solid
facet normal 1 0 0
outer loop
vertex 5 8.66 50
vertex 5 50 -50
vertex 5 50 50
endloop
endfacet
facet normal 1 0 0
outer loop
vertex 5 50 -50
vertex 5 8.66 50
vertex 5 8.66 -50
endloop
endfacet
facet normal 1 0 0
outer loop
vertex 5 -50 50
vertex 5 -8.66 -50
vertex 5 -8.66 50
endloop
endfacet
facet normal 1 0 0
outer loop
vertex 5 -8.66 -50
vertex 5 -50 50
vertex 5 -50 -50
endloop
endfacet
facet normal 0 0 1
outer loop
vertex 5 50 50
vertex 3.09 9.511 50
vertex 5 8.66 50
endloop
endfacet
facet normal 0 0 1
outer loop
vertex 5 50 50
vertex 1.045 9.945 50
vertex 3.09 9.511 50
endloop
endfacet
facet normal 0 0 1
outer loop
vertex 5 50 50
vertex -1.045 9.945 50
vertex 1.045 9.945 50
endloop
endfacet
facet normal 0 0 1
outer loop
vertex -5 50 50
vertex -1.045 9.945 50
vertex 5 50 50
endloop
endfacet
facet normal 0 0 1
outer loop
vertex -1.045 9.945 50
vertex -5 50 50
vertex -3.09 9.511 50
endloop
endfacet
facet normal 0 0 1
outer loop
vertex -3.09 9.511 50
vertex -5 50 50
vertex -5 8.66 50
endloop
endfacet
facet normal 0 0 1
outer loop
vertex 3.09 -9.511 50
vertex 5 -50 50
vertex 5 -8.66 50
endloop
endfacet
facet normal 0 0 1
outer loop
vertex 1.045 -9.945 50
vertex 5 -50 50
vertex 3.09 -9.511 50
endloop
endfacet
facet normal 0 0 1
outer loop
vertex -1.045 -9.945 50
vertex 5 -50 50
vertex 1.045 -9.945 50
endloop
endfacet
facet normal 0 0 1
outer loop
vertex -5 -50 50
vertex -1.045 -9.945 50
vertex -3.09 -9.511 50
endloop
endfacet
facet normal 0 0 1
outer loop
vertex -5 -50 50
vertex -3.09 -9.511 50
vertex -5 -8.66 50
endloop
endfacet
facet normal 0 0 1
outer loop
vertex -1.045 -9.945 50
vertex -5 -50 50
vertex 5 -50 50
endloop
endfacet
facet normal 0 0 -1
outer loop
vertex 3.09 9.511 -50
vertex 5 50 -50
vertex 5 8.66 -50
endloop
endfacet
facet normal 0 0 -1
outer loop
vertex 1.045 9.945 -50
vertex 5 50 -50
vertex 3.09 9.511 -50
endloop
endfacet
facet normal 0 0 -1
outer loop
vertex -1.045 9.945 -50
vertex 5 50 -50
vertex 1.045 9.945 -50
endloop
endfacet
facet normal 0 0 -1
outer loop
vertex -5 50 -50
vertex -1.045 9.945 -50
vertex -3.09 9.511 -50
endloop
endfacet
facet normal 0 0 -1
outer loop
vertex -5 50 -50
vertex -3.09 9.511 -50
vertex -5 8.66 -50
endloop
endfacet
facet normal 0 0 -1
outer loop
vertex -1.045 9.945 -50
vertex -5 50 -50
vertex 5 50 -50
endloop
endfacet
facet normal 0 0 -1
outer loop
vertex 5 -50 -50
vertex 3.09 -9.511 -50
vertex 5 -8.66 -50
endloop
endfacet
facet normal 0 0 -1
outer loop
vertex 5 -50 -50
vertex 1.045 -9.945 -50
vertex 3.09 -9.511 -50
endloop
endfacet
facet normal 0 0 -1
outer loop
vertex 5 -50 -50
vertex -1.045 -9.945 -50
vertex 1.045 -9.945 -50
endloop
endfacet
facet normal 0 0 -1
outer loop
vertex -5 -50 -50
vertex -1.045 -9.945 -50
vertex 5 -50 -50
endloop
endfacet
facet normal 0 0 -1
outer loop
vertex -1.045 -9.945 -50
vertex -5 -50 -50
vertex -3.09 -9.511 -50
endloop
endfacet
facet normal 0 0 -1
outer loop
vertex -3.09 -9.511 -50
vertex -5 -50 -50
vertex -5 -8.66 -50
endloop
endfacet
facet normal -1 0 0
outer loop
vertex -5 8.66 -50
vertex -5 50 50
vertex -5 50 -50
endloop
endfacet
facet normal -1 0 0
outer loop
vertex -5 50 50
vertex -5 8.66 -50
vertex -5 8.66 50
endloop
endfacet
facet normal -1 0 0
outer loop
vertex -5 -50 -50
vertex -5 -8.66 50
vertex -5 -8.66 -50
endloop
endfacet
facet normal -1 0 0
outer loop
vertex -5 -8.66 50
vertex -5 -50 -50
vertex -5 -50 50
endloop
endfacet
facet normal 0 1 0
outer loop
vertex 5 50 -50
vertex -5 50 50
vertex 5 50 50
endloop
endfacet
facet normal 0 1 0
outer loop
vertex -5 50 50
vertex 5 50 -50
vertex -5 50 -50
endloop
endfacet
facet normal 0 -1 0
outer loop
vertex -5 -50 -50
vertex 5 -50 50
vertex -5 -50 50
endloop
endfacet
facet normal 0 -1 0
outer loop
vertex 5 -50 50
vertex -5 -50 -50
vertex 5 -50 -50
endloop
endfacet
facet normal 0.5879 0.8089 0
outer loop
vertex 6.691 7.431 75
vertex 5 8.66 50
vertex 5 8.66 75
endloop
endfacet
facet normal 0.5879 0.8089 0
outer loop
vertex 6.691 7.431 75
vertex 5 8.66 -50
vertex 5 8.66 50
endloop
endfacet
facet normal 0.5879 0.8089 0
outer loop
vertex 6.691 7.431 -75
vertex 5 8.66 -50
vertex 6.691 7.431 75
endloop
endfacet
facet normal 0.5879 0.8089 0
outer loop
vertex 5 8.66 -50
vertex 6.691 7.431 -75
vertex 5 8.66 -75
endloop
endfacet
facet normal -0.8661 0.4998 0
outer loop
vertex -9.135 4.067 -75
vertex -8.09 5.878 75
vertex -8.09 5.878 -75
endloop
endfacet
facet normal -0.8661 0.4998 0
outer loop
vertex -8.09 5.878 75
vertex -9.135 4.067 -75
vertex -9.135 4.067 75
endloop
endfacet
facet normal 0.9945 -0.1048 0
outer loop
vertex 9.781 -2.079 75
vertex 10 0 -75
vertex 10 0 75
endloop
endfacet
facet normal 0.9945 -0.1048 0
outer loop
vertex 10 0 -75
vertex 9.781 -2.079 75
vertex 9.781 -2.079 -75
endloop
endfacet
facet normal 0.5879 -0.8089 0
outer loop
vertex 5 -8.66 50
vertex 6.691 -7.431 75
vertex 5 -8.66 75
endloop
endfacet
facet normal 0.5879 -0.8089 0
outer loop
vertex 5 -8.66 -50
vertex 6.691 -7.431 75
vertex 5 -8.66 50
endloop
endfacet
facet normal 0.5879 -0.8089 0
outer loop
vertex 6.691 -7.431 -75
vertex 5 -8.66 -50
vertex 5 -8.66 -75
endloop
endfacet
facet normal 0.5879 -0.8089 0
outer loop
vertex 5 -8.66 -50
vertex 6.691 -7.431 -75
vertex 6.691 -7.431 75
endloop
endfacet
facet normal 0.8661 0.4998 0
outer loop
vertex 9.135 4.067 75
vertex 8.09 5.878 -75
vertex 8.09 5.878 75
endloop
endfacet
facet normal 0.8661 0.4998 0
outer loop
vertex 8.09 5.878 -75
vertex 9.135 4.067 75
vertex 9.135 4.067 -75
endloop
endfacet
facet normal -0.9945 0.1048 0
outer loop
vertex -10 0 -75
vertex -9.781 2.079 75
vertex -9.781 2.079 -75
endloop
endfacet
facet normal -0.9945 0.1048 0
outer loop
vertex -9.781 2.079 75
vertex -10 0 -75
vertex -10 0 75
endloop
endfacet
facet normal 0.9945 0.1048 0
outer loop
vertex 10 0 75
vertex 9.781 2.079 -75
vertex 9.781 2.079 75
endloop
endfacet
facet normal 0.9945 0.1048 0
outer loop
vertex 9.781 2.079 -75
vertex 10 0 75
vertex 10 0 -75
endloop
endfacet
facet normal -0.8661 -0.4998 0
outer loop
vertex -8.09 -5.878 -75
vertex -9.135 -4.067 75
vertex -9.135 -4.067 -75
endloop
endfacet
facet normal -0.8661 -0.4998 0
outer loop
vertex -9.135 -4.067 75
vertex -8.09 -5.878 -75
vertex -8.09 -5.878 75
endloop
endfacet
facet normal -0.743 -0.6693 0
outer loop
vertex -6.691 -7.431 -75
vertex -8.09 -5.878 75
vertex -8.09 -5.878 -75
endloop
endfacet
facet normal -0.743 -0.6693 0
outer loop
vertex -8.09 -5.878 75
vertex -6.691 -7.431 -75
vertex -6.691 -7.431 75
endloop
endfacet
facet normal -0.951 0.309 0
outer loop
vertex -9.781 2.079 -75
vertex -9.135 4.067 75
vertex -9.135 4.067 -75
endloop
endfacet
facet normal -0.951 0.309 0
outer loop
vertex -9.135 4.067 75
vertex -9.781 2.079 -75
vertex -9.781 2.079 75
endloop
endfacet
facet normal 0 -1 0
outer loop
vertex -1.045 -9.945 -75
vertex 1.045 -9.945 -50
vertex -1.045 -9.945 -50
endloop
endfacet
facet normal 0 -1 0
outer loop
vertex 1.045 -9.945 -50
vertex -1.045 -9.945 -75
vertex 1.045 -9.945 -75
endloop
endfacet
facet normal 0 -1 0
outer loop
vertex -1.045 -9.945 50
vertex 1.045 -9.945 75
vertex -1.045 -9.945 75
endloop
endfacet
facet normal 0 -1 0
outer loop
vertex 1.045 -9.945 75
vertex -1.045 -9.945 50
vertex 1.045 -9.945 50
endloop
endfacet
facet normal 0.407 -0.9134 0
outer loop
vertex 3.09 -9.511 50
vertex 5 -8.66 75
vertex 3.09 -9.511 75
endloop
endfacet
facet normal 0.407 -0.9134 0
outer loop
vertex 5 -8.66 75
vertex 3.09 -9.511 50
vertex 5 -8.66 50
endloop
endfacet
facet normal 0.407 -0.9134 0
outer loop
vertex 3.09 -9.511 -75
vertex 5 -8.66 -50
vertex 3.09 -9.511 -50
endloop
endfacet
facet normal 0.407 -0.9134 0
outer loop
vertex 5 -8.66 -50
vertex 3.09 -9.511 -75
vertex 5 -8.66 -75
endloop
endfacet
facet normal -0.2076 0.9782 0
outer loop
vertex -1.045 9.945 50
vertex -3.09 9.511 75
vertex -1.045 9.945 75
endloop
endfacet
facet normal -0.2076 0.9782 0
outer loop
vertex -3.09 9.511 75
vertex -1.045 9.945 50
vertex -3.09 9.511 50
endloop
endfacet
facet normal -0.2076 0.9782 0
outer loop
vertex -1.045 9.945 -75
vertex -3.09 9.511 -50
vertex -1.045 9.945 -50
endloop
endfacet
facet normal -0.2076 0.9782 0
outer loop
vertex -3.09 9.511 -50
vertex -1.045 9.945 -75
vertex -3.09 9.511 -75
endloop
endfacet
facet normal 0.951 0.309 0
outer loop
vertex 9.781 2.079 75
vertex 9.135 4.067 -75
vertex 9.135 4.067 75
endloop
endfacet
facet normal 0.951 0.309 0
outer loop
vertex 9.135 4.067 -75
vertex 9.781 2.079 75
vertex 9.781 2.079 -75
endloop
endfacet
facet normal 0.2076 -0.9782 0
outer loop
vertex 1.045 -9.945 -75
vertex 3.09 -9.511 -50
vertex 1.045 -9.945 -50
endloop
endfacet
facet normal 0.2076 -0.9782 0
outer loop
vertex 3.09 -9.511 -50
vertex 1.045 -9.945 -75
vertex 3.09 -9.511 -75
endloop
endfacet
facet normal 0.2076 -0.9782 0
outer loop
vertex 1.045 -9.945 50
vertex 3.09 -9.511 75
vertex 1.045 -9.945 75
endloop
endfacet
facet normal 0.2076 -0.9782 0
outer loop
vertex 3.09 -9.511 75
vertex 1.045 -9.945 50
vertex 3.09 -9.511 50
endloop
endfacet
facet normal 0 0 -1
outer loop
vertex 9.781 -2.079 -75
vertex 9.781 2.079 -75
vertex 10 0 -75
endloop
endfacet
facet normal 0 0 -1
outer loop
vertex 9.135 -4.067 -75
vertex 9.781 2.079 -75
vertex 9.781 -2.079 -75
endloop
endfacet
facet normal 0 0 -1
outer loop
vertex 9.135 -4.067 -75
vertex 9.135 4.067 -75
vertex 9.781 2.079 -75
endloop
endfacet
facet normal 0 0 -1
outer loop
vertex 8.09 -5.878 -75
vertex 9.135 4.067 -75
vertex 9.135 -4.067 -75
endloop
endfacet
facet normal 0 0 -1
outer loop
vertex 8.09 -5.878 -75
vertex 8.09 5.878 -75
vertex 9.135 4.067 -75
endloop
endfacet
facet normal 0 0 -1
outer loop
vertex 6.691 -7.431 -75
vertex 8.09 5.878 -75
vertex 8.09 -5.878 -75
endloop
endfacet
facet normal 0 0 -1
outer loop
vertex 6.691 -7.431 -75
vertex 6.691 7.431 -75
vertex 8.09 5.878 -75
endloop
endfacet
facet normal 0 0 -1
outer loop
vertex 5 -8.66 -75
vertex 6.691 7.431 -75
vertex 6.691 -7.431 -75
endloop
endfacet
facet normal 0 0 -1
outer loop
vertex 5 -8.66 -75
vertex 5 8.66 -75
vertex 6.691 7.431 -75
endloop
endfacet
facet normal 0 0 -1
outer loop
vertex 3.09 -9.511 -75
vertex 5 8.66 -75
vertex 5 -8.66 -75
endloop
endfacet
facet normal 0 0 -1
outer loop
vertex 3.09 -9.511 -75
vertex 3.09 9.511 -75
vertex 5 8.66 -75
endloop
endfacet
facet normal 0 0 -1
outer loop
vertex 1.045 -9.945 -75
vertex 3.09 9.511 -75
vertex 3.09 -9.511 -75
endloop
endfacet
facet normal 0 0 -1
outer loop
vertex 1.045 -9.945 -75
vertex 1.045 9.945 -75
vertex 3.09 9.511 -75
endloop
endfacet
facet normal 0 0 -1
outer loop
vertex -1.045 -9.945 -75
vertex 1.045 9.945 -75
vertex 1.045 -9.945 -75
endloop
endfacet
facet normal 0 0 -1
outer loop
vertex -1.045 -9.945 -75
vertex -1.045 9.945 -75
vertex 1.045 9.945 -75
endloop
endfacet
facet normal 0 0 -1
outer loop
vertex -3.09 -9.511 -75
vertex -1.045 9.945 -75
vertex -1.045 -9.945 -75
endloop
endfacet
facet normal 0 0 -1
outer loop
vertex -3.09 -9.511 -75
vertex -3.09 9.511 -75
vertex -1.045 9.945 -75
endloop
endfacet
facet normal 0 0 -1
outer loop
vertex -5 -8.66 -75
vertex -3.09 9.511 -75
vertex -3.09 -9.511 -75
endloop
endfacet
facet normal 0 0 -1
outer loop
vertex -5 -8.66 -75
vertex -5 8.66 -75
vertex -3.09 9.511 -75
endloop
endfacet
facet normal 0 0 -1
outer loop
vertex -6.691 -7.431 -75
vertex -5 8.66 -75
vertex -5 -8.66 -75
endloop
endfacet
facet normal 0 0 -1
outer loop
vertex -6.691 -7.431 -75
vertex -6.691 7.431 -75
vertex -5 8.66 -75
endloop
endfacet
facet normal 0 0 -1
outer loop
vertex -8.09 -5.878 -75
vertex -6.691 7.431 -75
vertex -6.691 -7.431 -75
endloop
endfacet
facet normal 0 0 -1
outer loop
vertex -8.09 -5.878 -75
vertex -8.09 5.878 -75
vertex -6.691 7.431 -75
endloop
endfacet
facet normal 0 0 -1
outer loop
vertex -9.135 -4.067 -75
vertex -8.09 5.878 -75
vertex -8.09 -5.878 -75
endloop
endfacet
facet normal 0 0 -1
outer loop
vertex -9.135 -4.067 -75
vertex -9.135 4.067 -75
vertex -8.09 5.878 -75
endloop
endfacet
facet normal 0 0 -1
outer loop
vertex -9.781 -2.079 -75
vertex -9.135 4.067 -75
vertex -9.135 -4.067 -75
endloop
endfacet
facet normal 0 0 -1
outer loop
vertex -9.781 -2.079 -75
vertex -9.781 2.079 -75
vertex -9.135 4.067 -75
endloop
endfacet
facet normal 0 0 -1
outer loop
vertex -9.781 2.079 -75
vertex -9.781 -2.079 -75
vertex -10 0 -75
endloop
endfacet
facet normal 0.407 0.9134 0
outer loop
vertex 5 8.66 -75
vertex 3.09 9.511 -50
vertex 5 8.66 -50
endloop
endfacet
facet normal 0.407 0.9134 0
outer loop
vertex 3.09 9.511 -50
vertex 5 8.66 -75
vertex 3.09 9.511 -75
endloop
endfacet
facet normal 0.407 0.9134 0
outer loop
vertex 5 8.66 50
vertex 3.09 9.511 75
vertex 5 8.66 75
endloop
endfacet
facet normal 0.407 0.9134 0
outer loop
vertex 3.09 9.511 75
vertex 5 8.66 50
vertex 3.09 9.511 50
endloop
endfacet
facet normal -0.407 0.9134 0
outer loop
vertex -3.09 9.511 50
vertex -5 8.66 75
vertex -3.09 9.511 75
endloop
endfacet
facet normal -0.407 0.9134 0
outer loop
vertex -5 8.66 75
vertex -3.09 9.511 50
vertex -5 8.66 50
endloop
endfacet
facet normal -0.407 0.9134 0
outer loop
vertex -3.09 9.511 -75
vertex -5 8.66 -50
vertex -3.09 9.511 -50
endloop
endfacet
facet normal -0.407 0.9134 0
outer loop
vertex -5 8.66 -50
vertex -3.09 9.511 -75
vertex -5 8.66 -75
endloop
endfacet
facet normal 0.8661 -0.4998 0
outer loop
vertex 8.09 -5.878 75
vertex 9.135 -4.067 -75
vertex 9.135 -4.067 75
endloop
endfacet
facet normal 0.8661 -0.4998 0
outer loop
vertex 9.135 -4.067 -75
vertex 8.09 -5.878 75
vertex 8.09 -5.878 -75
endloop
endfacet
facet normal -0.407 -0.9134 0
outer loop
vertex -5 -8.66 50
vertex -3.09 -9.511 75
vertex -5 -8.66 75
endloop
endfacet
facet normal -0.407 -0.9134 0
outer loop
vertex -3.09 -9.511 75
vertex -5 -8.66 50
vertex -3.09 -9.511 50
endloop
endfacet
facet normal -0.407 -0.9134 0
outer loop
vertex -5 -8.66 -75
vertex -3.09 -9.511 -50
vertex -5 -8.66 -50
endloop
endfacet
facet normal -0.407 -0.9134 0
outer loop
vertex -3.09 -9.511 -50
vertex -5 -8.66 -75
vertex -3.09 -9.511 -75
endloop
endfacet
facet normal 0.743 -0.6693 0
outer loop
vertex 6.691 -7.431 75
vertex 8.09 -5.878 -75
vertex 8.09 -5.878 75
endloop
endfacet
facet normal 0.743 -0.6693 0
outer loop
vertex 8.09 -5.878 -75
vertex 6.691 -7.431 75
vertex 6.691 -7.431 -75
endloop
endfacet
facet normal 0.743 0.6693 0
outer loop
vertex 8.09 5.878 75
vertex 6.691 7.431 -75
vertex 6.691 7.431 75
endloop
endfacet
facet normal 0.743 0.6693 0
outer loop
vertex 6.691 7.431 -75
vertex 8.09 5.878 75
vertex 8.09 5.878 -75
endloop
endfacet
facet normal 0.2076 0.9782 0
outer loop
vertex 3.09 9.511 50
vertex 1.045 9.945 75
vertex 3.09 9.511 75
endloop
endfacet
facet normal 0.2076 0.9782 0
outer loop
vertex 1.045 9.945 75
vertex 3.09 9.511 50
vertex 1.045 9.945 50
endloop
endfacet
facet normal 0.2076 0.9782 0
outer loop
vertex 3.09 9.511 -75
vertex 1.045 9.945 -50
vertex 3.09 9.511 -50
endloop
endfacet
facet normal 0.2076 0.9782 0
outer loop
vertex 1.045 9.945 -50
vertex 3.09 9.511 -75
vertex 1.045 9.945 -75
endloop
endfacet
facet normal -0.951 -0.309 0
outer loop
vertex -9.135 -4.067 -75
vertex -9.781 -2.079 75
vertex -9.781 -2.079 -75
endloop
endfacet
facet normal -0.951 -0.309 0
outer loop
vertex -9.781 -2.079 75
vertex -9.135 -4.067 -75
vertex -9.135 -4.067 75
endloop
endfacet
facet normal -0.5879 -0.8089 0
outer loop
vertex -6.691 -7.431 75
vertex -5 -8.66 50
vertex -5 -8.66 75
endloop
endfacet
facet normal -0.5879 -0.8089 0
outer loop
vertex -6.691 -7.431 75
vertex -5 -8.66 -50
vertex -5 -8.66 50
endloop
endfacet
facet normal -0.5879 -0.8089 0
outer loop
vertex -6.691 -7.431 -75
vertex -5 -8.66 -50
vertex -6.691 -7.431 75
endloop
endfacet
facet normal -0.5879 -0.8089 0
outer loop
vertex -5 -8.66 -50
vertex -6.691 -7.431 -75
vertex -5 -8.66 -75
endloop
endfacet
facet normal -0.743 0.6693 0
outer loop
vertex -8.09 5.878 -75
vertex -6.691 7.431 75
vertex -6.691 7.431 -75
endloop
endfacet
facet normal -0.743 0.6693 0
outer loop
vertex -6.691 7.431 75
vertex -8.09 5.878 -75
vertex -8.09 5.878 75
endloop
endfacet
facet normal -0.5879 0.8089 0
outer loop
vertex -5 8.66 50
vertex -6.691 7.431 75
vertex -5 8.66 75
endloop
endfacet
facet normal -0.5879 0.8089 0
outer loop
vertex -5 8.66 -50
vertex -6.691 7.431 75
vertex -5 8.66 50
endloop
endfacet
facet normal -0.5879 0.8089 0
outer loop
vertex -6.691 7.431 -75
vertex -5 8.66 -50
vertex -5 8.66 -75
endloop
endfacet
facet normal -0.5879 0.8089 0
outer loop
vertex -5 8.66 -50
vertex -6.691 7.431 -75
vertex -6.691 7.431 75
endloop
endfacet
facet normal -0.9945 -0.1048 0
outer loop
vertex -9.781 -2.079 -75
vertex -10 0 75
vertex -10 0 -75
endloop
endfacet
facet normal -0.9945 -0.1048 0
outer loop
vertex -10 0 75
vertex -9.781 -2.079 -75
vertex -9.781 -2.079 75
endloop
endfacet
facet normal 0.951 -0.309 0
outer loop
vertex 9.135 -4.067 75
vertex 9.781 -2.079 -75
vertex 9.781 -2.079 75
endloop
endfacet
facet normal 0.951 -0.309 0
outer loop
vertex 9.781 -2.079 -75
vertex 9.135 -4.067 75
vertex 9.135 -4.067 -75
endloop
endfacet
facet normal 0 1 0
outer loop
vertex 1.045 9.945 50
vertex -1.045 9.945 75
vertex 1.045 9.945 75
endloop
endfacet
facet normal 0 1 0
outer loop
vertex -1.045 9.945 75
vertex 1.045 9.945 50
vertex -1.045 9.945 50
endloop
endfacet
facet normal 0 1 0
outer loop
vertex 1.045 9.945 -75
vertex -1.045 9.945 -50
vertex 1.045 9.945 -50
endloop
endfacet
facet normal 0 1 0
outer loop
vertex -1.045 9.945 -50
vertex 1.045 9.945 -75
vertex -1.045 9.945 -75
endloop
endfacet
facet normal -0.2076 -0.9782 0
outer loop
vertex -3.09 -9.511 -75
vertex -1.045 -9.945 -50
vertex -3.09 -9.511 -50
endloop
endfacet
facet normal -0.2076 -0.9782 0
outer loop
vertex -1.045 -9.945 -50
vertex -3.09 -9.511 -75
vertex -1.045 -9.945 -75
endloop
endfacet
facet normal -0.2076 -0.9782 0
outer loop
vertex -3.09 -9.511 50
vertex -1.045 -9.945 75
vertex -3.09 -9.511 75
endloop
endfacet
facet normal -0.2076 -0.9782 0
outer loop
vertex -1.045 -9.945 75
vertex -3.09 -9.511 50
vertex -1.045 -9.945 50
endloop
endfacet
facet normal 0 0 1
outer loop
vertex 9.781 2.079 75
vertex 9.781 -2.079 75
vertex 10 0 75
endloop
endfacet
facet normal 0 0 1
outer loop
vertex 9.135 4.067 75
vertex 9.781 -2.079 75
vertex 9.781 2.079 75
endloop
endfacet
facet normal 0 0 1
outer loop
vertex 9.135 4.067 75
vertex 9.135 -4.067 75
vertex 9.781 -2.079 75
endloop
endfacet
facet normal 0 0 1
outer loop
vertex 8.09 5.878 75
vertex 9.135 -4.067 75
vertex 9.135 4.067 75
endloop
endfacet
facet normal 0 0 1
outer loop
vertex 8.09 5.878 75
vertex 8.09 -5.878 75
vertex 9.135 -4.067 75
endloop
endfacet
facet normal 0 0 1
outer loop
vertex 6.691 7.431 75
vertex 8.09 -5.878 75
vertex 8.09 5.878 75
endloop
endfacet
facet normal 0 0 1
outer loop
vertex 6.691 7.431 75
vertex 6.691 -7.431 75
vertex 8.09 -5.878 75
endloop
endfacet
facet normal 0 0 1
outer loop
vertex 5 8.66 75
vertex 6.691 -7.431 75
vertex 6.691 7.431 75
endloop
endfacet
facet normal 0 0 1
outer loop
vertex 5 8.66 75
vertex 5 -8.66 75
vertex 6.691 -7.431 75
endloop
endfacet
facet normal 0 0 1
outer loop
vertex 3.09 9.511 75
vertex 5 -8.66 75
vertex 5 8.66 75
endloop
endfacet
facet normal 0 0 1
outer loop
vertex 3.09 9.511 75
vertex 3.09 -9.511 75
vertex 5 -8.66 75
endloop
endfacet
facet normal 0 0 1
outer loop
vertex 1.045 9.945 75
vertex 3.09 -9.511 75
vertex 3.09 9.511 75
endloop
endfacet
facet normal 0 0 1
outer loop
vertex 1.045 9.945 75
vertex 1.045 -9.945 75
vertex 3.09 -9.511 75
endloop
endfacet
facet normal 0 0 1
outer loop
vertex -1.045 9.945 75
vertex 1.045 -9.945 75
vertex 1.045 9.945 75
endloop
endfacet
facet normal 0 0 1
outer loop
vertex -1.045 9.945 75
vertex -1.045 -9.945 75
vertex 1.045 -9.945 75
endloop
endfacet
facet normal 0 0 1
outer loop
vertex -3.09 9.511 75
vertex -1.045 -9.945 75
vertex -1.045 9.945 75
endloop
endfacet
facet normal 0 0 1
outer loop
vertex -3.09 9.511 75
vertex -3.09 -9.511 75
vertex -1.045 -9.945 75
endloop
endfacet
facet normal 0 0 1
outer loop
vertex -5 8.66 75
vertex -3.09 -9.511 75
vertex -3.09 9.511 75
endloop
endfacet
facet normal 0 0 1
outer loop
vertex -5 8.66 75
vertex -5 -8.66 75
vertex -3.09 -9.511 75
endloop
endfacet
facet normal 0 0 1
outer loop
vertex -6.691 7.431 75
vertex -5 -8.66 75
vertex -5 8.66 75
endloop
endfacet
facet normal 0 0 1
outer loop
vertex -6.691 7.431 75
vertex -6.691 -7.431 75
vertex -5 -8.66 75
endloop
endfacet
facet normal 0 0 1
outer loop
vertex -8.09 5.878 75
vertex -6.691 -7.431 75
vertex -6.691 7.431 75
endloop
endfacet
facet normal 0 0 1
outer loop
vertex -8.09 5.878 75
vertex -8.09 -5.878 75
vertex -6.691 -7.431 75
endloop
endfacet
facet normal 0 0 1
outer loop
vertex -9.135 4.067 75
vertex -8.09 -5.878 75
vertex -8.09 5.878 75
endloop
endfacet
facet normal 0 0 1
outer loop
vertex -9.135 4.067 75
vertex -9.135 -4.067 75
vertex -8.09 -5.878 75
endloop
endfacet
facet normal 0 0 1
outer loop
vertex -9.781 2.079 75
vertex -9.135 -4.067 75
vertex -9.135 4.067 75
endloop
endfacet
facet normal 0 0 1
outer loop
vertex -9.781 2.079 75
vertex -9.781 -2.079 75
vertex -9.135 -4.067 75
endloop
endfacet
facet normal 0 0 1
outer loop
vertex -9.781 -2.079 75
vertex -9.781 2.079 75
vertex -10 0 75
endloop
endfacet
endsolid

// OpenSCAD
union () {
  cube ([10, 100, 100], center=true);
  sphere (r=10);
  cylinder (h=150, r=10, center=true);
}
